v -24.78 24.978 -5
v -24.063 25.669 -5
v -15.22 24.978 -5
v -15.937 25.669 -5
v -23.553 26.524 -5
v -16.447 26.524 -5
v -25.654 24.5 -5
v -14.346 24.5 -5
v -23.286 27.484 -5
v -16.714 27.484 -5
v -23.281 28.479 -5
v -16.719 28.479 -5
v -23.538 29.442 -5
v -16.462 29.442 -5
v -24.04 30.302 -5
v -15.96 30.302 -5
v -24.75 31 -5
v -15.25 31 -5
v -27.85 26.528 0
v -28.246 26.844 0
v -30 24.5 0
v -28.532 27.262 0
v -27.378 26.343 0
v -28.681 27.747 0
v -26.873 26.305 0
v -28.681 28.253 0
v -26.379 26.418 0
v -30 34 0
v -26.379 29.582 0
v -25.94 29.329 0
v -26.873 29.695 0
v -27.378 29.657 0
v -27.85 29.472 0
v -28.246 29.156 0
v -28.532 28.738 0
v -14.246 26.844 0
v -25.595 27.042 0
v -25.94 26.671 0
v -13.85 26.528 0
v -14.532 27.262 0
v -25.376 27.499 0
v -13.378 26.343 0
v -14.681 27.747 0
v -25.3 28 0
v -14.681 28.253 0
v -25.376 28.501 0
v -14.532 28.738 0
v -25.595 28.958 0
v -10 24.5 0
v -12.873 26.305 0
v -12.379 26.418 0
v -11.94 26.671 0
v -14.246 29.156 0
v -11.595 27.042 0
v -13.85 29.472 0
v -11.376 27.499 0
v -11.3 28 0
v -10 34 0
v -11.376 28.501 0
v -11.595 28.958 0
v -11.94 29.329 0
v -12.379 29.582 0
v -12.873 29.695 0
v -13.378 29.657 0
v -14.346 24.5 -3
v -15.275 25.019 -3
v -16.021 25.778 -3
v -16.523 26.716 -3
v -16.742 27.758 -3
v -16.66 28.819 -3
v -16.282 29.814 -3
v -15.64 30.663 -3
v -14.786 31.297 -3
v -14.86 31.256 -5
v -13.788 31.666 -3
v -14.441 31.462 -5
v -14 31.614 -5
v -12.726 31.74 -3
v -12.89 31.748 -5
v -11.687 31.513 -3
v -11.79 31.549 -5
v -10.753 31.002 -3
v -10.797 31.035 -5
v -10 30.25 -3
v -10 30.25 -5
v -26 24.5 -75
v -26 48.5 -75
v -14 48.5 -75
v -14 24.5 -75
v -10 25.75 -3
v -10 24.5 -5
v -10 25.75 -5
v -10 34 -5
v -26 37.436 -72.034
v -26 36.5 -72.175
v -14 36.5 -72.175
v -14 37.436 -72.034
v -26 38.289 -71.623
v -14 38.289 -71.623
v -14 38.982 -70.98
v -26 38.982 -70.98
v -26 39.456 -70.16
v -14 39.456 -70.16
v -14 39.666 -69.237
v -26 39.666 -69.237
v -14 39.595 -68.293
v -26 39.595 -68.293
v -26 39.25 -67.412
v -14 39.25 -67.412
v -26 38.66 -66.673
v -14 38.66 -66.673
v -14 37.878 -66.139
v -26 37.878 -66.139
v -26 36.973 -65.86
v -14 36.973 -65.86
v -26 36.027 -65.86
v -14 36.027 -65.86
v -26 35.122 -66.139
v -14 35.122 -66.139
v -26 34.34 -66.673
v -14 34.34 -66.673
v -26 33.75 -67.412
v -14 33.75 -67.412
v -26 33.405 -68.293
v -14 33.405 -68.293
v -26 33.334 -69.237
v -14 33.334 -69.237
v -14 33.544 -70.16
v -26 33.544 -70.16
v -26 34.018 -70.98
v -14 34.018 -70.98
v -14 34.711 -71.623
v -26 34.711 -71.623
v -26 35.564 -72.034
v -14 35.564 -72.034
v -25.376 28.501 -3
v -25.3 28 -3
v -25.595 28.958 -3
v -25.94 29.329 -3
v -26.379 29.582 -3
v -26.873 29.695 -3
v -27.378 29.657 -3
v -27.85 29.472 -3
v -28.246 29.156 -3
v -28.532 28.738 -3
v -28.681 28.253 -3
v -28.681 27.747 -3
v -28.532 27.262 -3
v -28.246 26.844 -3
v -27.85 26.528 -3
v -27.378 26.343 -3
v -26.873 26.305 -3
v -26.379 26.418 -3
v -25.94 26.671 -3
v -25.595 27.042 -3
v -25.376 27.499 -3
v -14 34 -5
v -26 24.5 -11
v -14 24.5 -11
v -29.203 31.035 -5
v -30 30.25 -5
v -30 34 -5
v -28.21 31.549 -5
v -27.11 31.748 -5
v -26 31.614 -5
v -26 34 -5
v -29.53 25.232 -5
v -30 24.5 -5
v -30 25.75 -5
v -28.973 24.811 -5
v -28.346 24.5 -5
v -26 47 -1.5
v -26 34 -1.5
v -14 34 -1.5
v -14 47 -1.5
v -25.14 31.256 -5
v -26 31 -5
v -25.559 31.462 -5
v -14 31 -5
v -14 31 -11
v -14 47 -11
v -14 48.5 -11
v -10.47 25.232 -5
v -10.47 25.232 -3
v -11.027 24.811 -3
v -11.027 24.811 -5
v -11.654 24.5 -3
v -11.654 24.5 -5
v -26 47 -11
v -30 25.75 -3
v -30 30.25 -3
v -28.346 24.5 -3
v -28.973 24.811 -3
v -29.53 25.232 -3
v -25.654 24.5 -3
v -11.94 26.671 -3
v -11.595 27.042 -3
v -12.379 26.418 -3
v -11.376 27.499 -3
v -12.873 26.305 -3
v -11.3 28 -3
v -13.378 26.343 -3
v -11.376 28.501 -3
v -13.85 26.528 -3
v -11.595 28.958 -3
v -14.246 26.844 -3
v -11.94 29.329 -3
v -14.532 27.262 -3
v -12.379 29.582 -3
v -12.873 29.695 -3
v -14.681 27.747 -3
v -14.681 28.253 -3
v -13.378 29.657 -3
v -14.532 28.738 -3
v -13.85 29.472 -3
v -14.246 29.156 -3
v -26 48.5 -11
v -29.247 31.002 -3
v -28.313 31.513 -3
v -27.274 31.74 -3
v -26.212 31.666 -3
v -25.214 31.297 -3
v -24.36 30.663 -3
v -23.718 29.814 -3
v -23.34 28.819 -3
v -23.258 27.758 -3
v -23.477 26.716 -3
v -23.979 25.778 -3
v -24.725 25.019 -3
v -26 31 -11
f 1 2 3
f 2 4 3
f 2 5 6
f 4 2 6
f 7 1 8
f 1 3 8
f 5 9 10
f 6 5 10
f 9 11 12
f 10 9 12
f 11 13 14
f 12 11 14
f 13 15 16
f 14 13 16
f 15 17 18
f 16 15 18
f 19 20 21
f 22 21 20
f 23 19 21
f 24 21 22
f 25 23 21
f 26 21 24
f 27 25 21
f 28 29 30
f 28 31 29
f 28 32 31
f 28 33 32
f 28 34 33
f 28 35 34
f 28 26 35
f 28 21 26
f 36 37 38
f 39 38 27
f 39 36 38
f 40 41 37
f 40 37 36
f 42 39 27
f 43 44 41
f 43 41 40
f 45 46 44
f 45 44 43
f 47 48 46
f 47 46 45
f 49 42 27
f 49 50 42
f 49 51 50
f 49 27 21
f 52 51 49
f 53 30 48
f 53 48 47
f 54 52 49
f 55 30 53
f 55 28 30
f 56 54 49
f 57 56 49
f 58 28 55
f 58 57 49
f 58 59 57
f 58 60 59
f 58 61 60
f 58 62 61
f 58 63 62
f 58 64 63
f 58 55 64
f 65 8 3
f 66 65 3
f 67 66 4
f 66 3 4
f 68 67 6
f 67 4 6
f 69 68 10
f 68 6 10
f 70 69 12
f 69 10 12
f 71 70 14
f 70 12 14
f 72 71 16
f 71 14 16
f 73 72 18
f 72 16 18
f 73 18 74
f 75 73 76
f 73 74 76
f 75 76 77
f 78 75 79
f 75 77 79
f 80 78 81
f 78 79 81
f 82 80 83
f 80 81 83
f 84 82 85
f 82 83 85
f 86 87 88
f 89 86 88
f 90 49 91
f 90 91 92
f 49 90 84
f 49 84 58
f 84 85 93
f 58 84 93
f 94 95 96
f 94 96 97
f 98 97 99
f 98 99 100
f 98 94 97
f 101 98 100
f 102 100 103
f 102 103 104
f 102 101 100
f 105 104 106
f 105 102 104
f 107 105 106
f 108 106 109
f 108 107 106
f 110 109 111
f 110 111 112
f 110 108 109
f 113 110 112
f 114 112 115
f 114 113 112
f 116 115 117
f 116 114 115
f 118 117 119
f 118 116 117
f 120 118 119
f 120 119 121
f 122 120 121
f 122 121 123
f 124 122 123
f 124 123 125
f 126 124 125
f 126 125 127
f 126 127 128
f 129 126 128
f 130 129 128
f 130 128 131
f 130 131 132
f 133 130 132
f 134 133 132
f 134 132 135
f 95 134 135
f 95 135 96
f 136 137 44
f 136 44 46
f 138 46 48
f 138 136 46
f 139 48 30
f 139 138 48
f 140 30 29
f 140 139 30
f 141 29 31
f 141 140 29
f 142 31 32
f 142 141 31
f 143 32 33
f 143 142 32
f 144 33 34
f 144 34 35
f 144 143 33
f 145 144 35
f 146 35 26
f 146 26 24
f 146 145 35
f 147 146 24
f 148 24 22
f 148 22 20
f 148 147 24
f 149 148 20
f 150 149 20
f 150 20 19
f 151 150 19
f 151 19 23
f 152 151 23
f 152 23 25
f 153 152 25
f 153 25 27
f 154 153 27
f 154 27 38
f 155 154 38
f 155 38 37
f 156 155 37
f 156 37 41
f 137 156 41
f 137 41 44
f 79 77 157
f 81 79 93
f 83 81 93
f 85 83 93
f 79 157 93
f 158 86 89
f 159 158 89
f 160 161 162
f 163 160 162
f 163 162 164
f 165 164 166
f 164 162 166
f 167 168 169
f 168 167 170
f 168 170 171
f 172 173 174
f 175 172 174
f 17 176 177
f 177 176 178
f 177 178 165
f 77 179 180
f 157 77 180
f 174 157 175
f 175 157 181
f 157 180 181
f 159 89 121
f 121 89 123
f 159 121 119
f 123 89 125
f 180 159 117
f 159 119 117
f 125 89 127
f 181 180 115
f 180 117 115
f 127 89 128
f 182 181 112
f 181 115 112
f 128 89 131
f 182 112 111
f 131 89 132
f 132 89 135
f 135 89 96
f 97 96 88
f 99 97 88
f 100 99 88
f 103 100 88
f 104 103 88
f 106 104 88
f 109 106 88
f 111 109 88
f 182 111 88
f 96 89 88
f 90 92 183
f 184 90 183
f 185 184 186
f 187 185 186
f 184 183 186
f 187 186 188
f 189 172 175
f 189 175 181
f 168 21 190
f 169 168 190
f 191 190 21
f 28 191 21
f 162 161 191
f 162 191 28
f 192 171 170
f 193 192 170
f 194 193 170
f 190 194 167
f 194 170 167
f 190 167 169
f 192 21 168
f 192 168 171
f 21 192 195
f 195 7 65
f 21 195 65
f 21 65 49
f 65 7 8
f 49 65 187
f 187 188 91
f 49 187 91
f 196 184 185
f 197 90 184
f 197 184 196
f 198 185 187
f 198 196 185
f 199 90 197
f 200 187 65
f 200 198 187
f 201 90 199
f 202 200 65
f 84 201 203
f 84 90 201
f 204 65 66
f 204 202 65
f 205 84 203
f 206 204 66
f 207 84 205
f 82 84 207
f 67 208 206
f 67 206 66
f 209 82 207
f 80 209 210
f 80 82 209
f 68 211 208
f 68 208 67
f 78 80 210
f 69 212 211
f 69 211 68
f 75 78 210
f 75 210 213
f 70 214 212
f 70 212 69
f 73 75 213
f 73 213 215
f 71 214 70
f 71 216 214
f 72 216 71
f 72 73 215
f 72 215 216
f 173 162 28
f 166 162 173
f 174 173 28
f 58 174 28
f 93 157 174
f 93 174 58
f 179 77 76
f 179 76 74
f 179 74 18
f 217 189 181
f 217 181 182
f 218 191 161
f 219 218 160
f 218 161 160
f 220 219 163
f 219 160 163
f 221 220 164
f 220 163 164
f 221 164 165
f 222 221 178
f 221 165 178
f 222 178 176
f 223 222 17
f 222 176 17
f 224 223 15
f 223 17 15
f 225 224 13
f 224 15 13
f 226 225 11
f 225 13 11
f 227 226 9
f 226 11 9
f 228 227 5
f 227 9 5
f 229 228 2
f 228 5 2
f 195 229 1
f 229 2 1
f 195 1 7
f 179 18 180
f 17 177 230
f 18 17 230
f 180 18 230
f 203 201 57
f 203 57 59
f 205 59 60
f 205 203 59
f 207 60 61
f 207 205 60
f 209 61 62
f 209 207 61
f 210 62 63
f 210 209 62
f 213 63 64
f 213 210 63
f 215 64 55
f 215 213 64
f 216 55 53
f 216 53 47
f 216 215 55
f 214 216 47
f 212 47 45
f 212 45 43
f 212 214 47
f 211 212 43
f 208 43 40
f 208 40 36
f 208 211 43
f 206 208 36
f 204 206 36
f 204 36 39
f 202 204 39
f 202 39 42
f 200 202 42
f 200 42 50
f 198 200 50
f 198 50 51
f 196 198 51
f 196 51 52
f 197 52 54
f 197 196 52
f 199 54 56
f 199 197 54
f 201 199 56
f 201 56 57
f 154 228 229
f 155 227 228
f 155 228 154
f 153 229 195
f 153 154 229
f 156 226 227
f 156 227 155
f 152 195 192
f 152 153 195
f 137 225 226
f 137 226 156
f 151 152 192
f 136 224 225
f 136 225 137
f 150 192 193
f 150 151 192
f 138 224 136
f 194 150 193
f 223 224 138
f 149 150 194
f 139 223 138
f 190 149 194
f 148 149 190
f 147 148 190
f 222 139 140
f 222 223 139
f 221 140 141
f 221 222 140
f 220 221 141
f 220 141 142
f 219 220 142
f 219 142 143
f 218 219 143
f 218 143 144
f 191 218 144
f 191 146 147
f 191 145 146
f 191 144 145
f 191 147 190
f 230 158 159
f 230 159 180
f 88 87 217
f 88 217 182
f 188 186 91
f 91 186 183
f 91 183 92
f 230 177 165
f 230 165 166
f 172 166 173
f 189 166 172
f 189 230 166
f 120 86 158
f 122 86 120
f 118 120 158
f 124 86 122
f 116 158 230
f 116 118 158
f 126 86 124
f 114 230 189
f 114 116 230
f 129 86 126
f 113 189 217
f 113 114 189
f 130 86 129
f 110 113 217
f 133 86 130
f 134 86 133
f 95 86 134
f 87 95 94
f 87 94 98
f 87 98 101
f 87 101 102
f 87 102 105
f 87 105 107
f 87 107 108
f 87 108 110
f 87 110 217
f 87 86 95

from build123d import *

# Parameters (mm, degrees)
FIVE_MM_ATTACHMENT_FOOT_START                      = -5
SKETCH1_W                                          = 20
SKETCH1_H                                          = 9.5
SKETCH1_R                                          = 1.7
FIVE_MM_ATTACHMENT_FOOT_DEPTH                      = 5
DEEP_ACTUATOR_WEB_START                            = -69
SKETCH2_W                                          = 12
SKETCH2_H                                          = 24
DEEP_ACTUATOR_WEB_DEPTH                            = 67.5
QUARTER20_AXIAL_THREAD_MAJOR_ENVELOPE_DEPTH        = 90.516758208
QUARTER20_AXIAL_THREAD_MAJOR_ENVELOPE_DEPTH_BACK   = 90.516758208
SKETCH3_R                                          = 3.175
BENCH_X_BORE_LOWER_LIGAMENT_START                  = -75
SKETCH4_W                                          = 12
SKETCH4_H                                          = 24
BENCH_X_BORE_LOWER_LIGAMENT_DEPTH                  = 6.01
BENCH_COMPLETE_QUARTER20_MAJOR_ENVELOPE_DEPTH      = 95.21915941
BENCH_COMPLETE_QUARTER20_MAJOR_ENVELOPE_DEPTH_BACK = 95.21915941
SKETCH5_R                                          = 3.175
FIXED_BASE_WINDOW_RELIEF_DEPTH                     = 95.21915941
FIXED_BASE_WINDOW_RELIEF_DEPTH_BACK                = 95.21915941
SKETCH6_W                                          = 6
SKETCH6_H                                          = 7
SKETCH6_W_2                                        = 10
SKETCH6_H_2                                        = 2
XDROP_M3_THROUGH_RECUT_START                       = -5.5
SKETCH7_R                                          = 1.7
XDROP_M3_THROUGH_RECUT_DEPTH                       = 5.5
SKETCH8_R                                          = 3.75
XDROP_M3_BOTTOM_COUNTERBORE_H2_DEPTH               = 2


with BuildPart() as part:
    # Sketch1 → Five_mm_Attachment_Foot (new body)
    with BuildSketch(Plane.XY.offset(FIVE_MM_ATTACHMENT_FOOT_START)):
        with Locations((-20, 29.25)):
            Rectangle(SKETCH1_W, SKETCH1_H)
        with Locations((-27, 28)):
            Circle(SKETCH1_R, mode=Mode.SUBTRACT)
        with Locations((-13, 28)):
            Circle(SKETCH1_R, mode=Mode.SUBTRACT)
    extrude(amount=FIVE_MM_ATTACHMENT_FOOT_DEPTH)

    # Sketch2 → Deep_Actuator_Web (add)
    with BuildSketch(Plane.XY.offset(DEEP_ACTUATOR_WEB_START)):
        with Locations((-20, 36.5)):
            Rectangle(SKETCH2_W, SKETCH2_H)
    extrude(amount=DEEP_ACTUATOR_WEB_DEPTH)

    # Sketch3 → Quarter20_Axial_Thread_Major_Envelope (cut, two sides: drawn at the far end of the back side and taken through both)
    with BuildSketch(Plane(origin=(0, 0, 0), x_dir=(0, 0, -1), z_dir=(1, 0, 0)).offset(-QUARTER20_AXIAL_THREAD_MAJOR_ENVELOPE_DEPTH_BACK)):
        with Locations((69, 36.5)):
            Circle(SKETCH3_R)
    extrude(amount=QUARTER20_AXIAL_THREAD_MAJOR_ENVELOPE_DEPTH + QUARTER20_AXIAL_THREAD_MAJOR_ENVELOPE_DEPTH_BACK, mode=Mode.SUBTRACT)

    # Sketch4 → Bench_X_Bore_Lower_Ligament (add)
    with BuildSketch(Plane.XY.offset(BENCH_X_BORE_LOWER_LIGAMENT_START)):
        with Locations((-20, 36.5)):
            Rectangle(SKETCH4_W, SKETCH4_H)
    extrude(amount=BENCH_X_BORE_LOWER_LIGAMENT_DEPTH)

    # Sketch5 → Bench_Complete_Quarter20_Major_Envelope (cut, two sides: drawn at the far end of the back side and taken through both)
    with BuildSketch(Plane(origin=(0, 0, 0), x_dir=(0, 0, -1), z_dir=(1, 0, 0)).offset(-BENCH_COMPLETE_QUARTER20_MAJOR_ENVELOPE_DEPTH_BACK)):
        with Locations((69, 36.5)):
            Circle(SKETCH5_R)
    extrude(amount=BENCH_COMPLETE_QUARTER20_MAJOR_ENVELOPE_DEPTH + BENCH_COMPLETE_QUARTER20_MAJOR_ENVELOPE_DEPTH_BACK, mode=Mode.SUBTRACT)

    # Sketch6 → Fixed_Base_Window_Relief (cut, two sides: drawn at the far end of the back side and taken through both)
    with BuildSketch(Plane(origin=(0, 0, 0), x_dir=(0, 0, -1), z_dir=(1, 0, 0)).offset(-FIXED_BASE_WINDOW_RELIEF_DEPTH_BACK)):
        with Locations((8, 27.5)):
            Rectangle(SKETCH6_W, SKETCH6_H)
        with Locations((6, 48)):
            Rectangle(SKETCH6_W_2, SKETCH6_H_2)
    extrude(amount=FIXED_BASE_WINDOW_RELIEF_DEPTH + FIXED_BASE_WINDOW_RELIEF_DEPTH_BACK, mode=Mode.SUBTRACT)

    # Sketch7 → XDrop_M3_Through_Recut (cut)
    with BuildSketch(Plane.XY.offset(XDROP_M3_THROUGH_RECUT_START)):
        with Locations((-27, 28)):
            Circle(SKETCH7_R)
        with Locations((-13, 28)):
            Circle(SKETCH7_R)
    extrude(amount=XDROP_M3_THROUGH_RECUT_DEPTH, mode=Mode.SUBTRACT)

    # Sketch8 → XDrop_M3_Bottom_Counterbore_H2 (cut)
    with BuildSketch(Plane(origin=(0, 0, -5), x_dir=(-1, 0, 0), z_dir=(0, 0, -1))):
        with Locations((27, 28)):
            Circle(SKETCH8_R)
        with Locations((13, 28)):
            Circle(SKETCH8_R)
    extrude(amount=-XDROP_M3_BOTTOM_COUNTERBORE_H2_DEPTH, mode=Mode.SUBTRACT)


solid = part.part
